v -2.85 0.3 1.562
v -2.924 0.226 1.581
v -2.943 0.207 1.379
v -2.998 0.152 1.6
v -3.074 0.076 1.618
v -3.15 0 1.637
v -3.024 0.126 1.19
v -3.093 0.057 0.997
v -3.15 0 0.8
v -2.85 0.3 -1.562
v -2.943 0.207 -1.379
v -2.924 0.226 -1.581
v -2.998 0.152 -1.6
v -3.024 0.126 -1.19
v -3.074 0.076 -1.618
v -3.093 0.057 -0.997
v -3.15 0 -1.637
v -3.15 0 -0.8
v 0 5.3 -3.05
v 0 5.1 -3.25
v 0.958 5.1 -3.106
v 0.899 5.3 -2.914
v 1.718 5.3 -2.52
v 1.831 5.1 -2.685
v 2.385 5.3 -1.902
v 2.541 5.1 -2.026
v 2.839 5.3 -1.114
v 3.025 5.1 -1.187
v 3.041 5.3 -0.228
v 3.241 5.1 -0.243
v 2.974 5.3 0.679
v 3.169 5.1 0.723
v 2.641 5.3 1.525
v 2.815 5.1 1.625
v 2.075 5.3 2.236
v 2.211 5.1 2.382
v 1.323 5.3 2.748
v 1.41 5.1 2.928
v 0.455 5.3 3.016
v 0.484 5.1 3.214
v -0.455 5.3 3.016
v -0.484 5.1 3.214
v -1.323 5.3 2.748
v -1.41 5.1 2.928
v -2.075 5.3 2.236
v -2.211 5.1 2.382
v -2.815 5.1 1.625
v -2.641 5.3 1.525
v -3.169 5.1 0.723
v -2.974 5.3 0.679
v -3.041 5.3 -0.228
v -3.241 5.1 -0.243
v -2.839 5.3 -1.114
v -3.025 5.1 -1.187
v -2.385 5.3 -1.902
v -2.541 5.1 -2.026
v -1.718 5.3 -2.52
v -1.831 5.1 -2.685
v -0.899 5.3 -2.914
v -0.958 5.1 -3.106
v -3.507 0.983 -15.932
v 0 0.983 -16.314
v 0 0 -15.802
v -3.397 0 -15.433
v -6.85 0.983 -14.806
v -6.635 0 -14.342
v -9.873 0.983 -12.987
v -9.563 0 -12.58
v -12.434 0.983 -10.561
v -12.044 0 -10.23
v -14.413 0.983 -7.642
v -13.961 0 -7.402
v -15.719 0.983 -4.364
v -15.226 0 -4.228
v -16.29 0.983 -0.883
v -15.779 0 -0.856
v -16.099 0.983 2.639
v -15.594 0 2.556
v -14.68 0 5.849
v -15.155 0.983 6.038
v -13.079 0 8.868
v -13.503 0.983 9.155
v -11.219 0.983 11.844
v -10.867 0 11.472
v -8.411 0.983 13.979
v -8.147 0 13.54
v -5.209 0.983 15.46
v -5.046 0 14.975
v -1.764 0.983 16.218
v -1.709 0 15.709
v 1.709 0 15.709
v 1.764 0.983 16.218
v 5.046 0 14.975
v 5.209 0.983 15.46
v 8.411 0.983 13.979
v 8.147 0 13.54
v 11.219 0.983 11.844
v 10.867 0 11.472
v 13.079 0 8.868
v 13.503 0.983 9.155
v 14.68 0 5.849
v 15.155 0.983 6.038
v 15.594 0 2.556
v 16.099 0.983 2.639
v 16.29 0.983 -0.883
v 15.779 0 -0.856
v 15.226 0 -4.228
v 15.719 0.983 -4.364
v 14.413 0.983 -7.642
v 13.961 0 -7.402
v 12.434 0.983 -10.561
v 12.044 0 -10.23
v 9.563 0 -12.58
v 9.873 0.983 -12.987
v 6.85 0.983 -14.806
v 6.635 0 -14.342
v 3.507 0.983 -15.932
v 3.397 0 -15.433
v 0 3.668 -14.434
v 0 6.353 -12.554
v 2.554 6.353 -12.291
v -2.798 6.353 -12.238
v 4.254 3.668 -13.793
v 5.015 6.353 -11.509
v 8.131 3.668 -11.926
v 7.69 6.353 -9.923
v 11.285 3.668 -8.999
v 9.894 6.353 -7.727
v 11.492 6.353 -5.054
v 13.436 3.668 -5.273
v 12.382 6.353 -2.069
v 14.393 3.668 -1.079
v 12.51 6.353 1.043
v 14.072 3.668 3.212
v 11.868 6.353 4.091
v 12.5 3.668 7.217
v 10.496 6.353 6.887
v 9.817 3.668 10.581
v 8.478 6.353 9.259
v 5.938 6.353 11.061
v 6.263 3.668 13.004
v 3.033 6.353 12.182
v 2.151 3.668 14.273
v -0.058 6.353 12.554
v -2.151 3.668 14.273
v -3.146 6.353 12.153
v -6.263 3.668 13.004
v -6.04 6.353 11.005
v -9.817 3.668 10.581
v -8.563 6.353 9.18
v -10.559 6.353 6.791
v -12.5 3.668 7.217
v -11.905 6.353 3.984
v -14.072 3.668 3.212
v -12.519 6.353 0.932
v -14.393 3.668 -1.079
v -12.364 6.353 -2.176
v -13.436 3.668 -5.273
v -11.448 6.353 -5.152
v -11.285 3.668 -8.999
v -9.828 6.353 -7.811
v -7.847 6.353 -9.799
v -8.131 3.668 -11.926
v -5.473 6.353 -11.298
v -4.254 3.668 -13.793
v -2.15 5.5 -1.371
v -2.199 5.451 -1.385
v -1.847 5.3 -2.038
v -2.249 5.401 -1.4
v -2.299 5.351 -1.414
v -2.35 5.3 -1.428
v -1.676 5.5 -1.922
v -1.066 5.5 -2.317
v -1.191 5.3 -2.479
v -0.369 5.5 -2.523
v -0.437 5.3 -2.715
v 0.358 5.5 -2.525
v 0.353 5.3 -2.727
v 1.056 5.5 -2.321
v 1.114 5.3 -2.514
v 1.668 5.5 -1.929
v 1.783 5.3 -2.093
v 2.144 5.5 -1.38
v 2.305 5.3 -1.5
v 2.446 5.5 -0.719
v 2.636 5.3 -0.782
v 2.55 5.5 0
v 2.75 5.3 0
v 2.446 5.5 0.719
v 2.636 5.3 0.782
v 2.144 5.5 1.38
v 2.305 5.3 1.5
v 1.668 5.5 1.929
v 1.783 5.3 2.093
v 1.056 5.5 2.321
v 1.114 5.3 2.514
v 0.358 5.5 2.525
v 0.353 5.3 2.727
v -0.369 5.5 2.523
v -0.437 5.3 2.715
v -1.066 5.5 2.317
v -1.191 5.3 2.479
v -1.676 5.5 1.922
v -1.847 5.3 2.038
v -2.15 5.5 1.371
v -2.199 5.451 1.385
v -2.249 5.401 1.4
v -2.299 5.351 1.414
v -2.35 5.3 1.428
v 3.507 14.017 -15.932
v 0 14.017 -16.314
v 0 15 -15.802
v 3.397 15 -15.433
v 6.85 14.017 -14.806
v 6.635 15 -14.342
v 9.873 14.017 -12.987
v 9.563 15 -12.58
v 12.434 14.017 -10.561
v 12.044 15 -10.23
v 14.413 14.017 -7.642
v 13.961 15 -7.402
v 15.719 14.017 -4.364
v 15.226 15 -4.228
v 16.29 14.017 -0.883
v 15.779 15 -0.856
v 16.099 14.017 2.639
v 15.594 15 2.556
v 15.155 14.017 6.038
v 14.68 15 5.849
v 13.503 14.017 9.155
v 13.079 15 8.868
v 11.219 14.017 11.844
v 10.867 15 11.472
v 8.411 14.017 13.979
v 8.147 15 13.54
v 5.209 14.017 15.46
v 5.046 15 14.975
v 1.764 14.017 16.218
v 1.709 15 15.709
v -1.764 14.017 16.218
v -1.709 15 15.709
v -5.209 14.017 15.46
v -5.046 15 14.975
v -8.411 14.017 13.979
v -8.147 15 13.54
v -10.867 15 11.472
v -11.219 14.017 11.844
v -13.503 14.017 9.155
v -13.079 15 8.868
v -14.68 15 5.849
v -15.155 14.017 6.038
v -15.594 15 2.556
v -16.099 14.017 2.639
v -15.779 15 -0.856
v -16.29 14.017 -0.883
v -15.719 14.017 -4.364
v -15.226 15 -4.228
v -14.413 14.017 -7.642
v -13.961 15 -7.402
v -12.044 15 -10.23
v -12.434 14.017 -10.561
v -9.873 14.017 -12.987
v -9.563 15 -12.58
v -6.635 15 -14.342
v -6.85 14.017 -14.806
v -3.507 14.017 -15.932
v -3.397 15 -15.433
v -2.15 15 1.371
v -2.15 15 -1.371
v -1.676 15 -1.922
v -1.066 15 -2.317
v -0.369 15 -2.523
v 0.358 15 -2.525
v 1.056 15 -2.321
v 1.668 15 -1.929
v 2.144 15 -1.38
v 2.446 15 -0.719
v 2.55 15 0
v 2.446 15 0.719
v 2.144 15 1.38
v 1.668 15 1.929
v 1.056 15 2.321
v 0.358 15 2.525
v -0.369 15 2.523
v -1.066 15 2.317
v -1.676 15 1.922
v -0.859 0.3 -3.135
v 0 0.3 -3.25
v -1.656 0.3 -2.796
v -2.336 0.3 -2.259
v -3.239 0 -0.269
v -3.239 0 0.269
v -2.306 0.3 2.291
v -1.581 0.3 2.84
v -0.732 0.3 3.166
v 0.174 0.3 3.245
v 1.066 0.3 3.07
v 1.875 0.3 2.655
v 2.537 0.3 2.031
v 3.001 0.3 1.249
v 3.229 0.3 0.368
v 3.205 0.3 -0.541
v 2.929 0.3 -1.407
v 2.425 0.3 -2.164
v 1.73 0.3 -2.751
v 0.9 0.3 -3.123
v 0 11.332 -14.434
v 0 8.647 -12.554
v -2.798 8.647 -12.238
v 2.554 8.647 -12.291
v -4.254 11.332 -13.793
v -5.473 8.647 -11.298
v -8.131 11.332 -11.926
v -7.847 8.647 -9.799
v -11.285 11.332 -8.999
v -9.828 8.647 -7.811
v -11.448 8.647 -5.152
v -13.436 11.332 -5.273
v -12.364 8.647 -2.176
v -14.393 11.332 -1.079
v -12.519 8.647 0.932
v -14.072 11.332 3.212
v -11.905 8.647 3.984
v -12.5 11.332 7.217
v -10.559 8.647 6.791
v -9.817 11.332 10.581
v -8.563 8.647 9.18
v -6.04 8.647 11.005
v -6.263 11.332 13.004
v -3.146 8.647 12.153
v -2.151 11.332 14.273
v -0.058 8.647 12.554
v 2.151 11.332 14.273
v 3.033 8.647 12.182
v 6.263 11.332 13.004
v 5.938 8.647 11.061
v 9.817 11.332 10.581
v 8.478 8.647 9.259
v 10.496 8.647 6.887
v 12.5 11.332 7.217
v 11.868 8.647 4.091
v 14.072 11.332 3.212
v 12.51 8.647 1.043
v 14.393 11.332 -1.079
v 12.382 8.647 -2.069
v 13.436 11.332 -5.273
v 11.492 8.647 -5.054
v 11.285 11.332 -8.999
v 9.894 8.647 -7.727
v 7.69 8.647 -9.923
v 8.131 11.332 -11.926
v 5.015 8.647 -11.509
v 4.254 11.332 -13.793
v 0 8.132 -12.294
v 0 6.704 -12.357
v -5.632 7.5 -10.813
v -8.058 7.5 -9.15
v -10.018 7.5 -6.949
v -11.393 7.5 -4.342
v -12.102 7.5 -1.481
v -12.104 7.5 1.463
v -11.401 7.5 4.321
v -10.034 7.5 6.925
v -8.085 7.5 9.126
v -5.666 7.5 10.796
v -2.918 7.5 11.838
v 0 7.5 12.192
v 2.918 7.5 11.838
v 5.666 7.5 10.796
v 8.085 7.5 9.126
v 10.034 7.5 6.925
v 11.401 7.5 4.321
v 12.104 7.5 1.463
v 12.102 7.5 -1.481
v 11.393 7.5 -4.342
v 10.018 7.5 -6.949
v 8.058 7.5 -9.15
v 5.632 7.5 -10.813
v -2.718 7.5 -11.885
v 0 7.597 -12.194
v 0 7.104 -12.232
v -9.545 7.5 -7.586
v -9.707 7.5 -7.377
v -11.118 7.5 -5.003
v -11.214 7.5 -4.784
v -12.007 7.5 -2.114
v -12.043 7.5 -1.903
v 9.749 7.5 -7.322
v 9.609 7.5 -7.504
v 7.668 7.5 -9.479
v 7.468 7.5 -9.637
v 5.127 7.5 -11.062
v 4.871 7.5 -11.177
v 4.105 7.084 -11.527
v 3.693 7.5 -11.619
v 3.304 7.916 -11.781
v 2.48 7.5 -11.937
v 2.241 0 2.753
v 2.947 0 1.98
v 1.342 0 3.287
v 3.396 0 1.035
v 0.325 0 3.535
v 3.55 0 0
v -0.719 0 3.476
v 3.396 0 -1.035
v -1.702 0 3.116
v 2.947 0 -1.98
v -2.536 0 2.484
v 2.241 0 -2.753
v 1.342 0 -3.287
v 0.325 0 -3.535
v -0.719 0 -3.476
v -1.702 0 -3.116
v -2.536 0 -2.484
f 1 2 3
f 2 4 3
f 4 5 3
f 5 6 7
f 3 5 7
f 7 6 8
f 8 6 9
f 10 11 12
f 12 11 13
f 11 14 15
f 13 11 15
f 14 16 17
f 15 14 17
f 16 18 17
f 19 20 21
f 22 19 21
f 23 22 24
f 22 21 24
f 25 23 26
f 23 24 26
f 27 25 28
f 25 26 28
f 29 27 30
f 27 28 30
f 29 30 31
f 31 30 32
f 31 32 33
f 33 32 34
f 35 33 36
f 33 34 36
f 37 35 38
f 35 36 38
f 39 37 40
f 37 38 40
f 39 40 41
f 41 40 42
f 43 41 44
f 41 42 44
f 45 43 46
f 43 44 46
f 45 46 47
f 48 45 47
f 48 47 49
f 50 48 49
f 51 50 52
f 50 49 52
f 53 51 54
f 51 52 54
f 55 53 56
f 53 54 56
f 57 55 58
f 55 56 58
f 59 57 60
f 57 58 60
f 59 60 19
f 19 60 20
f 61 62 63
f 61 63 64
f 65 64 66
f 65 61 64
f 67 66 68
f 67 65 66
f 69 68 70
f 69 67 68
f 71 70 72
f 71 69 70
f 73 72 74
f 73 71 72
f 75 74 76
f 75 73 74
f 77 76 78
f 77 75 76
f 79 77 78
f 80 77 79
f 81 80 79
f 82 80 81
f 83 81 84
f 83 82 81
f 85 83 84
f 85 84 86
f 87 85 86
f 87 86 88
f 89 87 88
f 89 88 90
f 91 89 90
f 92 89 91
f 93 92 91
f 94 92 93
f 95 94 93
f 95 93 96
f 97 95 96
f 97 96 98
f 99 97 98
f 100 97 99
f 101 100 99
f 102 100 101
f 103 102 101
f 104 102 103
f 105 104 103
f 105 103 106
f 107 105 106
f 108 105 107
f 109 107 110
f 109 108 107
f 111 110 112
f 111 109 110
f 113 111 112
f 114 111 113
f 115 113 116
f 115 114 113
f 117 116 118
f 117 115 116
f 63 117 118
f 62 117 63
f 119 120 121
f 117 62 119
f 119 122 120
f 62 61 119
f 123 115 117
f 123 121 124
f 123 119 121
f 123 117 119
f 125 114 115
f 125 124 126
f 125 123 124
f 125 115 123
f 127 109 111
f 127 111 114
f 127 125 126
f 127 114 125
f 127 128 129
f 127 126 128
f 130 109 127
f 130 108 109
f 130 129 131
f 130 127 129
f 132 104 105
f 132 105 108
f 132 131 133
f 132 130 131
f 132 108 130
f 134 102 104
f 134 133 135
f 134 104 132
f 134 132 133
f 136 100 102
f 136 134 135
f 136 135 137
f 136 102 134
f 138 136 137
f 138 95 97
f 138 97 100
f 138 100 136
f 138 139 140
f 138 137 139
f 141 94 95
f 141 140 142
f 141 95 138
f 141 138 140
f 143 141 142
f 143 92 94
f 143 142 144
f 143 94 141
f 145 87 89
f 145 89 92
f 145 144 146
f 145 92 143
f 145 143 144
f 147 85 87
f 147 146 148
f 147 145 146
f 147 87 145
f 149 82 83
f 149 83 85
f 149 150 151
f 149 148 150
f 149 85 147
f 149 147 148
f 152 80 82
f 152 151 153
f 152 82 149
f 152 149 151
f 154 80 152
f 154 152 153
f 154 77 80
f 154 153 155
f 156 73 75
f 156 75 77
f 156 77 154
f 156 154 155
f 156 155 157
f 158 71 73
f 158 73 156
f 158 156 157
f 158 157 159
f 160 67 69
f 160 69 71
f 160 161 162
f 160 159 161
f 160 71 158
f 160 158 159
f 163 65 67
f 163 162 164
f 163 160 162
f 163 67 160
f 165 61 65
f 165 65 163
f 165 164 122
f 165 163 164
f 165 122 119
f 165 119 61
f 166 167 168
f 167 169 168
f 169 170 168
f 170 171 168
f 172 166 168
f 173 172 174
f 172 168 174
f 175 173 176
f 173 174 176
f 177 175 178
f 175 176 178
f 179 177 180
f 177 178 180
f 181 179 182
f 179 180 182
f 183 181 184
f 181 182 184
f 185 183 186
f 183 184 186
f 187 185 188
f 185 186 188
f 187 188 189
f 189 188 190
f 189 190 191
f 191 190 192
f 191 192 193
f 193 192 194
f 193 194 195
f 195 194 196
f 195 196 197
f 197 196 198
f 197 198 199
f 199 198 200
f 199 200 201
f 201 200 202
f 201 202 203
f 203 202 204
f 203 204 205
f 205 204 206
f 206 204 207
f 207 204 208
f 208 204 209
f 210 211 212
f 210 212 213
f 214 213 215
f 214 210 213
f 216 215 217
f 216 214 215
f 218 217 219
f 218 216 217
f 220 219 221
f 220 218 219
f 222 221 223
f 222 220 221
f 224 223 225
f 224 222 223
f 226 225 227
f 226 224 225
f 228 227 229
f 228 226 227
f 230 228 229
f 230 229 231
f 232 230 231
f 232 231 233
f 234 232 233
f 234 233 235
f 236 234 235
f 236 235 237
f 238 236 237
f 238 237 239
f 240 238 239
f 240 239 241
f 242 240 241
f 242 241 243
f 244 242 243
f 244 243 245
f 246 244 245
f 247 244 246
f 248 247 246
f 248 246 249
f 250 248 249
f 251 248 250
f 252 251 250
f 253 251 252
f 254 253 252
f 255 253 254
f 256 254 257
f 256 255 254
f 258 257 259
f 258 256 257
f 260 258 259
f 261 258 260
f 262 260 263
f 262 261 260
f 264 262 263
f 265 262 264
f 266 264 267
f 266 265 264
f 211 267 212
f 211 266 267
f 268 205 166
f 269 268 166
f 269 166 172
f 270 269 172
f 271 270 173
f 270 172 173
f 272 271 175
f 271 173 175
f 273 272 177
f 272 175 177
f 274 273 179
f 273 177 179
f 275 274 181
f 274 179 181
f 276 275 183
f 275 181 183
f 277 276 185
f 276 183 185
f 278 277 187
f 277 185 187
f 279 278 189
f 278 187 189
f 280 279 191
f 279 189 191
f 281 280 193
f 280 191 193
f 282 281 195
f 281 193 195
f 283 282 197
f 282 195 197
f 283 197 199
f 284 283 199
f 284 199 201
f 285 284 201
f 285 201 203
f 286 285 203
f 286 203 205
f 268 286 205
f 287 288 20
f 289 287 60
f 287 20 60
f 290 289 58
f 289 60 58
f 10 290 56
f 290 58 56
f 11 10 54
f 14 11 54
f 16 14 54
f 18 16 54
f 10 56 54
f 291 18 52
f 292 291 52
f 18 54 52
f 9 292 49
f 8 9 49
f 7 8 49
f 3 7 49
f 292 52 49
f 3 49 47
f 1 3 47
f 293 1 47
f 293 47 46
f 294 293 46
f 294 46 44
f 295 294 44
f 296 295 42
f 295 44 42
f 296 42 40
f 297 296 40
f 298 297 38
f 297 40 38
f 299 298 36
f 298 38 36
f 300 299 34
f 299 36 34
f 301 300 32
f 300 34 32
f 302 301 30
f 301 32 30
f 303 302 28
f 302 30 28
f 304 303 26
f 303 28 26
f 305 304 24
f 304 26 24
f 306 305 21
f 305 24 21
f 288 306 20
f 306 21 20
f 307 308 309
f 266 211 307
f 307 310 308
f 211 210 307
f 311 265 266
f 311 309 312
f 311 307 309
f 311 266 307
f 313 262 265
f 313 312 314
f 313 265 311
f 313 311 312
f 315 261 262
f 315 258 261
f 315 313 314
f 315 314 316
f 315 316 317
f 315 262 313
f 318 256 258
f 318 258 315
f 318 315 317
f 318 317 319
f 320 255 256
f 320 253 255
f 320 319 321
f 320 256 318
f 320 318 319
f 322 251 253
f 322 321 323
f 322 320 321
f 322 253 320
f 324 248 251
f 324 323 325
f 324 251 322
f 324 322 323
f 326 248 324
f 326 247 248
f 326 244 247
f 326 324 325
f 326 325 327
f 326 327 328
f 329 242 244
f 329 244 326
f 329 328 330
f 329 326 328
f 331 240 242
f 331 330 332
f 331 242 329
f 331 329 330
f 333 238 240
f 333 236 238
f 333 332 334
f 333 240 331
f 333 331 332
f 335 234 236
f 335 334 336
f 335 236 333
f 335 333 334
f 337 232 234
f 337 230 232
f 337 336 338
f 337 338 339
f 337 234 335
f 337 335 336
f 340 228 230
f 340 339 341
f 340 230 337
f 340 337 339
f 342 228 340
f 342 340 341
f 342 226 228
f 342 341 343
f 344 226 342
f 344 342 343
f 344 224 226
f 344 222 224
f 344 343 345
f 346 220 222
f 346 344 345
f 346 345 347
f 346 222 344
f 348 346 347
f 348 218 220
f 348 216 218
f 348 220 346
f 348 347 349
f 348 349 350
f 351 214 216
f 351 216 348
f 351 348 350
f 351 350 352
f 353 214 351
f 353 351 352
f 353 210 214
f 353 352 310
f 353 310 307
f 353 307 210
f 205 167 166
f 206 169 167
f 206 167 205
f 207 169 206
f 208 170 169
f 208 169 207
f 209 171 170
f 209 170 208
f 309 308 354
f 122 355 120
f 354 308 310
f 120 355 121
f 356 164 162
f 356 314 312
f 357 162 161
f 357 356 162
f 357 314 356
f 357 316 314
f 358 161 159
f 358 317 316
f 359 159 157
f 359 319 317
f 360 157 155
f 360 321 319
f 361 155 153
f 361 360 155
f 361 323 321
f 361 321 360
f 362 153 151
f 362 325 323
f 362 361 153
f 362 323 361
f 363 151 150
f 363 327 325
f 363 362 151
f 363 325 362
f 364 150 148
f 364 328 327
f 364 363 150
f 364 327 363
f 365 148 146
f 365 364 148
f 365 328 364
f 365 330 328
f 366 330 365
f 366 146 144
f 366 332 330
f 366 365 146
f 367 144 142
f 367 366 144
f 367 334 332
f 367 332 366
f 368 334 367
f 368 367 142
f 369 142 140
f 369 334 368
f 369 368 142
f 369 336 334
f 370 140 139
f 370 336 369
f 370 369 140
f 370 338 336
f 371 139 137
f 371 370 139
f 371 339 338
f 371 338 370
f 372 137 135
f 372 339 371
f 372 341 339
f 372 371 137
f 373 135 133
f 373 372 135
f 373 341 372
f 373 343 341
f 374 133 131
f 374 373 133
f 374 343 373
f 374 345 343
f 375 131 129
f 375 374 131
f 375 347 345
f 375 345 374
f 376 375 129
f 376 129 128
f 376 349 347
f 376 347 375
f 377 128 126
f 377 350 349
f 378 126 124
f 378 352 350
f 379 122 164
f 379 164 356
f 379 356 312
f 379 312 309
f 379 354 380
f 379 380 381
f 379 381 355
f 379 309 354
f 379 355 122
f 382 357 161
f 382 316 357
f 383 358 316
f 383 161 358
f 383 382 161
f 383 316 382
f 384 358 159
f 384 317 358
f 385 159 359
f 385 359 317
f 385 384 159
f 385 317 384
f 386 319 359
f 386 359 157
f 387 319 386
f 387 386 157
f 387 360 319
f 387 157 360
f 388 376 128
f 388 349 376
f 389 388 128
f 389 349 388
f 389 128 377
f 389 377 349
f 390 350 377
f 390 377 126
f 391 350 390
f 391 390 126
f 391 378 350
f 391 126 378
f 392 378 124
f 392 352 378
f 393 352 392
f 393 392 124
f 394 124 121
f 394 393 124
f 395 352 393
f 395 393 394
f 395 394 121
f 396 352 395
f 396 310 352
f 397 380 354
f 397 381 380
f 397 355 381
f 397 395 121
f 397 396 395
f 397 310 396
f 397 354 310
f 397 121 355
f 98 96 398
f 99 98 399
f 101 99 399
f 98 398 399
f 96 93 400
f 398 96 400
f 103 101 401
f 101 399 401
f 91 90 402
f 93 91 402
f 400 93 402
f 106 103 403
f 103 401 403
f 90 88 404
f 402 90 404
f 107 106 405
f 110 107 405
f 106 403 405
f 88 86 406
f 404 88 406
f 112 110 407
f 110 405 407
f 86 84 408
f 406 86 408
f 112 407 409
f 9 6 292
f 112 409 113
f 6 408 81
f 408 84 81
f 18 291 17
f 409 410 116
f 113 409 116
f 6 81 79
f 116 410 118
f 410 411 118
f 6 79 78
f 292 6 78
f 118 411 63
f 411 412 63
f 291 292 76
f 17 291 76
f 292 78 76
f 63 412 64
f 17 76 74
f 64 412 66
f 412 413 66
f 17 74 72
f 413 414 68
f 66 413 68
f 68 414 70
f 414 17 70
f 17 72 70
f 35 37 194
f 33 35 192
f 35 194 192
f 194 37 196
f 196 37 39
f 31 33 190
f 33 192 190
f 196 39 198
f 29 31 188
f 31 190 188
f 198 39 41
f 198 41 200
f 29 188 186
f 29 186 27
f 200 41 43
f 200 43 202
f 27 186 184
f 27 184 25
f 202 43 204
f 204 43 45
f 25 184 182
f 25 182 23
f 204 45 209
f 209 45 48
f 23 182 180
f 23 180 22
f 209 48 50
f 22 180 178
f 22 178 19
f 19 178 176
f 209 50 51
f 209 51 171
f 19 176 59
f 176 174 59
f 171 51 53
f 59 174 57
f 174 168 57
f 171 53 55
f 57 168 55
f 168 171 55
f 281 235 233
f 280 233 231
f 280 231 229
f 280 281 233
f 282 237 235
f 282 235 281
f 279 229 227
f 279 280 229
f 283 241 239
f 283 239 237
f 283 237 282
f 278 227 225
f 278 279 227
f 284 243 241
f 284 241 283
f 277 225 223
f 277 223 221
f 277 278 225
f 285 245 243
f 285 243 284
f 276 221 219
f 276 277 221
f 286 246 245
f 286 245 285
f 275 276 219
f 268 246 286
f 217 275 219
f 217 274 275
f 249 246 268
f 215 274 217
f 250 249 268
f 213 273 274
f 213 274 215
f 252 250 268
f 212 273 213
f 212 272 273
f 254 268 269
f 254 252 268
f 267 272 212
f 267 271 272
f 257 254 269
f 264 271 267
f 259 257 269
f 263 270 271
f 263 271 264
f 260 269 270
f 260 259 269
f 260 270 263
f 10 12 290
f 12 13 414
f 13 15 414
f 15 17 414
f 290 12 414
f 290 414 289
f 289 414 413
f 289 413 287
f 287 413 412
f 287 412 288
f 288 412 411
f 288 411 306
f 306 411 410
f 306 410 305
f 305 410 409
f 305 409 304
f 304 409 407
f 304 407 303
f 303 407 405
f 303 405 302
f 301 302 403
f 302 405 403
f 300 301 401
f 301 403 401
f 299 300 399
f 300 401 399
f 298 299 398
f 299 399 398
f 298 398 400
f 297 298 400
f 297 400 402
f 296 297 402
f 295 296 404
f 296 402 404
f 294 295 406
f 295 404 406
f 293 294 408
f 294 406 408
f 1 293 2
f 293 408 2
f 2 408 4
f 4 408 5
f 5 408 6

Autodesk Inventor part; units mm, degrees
ref_plane "YZ Plane" through (0, 0, 0) normal (1, 0, 0) x (0, 1, 0)
sketch "Sketch1" plane through (0, 0, 0) normal (0, 1, 0) x (-1, 0, 0)
  arc A0 (2.15, 1.3711) -> (2.15, -1.3711) centre (0, 0) ccw
  line L0 (2.15, 1.3711) -> (2.15, -1.3711)
  dimension "d1" = 4.7
  dimension "d92" = 2.55
sketch "Sketch2" plane through (0, 0, 0) normal (1, 0, 0) x (0, 1, 0)
  line L0 (0, 0) -> (15, 0)
  line L1 (15, 0) -> (15, -14)
  line L2 (0, 0) -> (0, -14)
  line L3 (5, -10) -> (15, -17.0021)
  line L4 (15, -14) -> (15, -17.0021)
  line L5 (7.5, 0) -> (7.5, -2.5713) construction
  line L6 (10, -10) -> (0, -17.0021)
  line L7 (0, -14) -> (0, -17.0021)
  point P0 (7.5, -11.7505)
  dimension "d4" = 15
  dimension "d5" = 14
  dimension "d6" = 14
  dimension "d93" = 10
  dimension "d102" = 55
  dimension "d103" = 10
revolve "Revolution1" add sketch "Sketch2" angle 360 about axis through (0, 0, 0) along (0, 1, 0)
extrude "Extrusion1" cut sketch "Sketch1" along normal through all
chamfer "Chamfer1" distance 1.2 angle 45 2 edges at (0, 15, 17.0021) (0, 0, 17.0021)
ref_plane "Work Plane3" through (-14.15, 0, 1.3711) normal (1, 0, 0) x (0, 0, -1)
ref_plane "Work Plane4" through (0, 7.5, 0) normal (0, -1, 0) x (1, 0, 0)
fillet "Fillet1" radius 2 1 edges at (0, 7.5, 11.7505)
chamfer "Chamfer2" distance 1 angle 45 2 edges at (-2.15, 0, 0) (2.55, 0, 0)
hole "Hole4" at (0, 0, 0) direction (0, 1, 0) diameter 6.5 depth 5.3
chamfer "Chamfer3" distance 0.2 angle 45 3 edges at (-2.15, 5.3, 0) (2.55, 5.3, 0) (0, 5.3, 3.25)
equation "\"d6\" = d5"
properties part number "Stepper Pulley V12_3DPrint"
